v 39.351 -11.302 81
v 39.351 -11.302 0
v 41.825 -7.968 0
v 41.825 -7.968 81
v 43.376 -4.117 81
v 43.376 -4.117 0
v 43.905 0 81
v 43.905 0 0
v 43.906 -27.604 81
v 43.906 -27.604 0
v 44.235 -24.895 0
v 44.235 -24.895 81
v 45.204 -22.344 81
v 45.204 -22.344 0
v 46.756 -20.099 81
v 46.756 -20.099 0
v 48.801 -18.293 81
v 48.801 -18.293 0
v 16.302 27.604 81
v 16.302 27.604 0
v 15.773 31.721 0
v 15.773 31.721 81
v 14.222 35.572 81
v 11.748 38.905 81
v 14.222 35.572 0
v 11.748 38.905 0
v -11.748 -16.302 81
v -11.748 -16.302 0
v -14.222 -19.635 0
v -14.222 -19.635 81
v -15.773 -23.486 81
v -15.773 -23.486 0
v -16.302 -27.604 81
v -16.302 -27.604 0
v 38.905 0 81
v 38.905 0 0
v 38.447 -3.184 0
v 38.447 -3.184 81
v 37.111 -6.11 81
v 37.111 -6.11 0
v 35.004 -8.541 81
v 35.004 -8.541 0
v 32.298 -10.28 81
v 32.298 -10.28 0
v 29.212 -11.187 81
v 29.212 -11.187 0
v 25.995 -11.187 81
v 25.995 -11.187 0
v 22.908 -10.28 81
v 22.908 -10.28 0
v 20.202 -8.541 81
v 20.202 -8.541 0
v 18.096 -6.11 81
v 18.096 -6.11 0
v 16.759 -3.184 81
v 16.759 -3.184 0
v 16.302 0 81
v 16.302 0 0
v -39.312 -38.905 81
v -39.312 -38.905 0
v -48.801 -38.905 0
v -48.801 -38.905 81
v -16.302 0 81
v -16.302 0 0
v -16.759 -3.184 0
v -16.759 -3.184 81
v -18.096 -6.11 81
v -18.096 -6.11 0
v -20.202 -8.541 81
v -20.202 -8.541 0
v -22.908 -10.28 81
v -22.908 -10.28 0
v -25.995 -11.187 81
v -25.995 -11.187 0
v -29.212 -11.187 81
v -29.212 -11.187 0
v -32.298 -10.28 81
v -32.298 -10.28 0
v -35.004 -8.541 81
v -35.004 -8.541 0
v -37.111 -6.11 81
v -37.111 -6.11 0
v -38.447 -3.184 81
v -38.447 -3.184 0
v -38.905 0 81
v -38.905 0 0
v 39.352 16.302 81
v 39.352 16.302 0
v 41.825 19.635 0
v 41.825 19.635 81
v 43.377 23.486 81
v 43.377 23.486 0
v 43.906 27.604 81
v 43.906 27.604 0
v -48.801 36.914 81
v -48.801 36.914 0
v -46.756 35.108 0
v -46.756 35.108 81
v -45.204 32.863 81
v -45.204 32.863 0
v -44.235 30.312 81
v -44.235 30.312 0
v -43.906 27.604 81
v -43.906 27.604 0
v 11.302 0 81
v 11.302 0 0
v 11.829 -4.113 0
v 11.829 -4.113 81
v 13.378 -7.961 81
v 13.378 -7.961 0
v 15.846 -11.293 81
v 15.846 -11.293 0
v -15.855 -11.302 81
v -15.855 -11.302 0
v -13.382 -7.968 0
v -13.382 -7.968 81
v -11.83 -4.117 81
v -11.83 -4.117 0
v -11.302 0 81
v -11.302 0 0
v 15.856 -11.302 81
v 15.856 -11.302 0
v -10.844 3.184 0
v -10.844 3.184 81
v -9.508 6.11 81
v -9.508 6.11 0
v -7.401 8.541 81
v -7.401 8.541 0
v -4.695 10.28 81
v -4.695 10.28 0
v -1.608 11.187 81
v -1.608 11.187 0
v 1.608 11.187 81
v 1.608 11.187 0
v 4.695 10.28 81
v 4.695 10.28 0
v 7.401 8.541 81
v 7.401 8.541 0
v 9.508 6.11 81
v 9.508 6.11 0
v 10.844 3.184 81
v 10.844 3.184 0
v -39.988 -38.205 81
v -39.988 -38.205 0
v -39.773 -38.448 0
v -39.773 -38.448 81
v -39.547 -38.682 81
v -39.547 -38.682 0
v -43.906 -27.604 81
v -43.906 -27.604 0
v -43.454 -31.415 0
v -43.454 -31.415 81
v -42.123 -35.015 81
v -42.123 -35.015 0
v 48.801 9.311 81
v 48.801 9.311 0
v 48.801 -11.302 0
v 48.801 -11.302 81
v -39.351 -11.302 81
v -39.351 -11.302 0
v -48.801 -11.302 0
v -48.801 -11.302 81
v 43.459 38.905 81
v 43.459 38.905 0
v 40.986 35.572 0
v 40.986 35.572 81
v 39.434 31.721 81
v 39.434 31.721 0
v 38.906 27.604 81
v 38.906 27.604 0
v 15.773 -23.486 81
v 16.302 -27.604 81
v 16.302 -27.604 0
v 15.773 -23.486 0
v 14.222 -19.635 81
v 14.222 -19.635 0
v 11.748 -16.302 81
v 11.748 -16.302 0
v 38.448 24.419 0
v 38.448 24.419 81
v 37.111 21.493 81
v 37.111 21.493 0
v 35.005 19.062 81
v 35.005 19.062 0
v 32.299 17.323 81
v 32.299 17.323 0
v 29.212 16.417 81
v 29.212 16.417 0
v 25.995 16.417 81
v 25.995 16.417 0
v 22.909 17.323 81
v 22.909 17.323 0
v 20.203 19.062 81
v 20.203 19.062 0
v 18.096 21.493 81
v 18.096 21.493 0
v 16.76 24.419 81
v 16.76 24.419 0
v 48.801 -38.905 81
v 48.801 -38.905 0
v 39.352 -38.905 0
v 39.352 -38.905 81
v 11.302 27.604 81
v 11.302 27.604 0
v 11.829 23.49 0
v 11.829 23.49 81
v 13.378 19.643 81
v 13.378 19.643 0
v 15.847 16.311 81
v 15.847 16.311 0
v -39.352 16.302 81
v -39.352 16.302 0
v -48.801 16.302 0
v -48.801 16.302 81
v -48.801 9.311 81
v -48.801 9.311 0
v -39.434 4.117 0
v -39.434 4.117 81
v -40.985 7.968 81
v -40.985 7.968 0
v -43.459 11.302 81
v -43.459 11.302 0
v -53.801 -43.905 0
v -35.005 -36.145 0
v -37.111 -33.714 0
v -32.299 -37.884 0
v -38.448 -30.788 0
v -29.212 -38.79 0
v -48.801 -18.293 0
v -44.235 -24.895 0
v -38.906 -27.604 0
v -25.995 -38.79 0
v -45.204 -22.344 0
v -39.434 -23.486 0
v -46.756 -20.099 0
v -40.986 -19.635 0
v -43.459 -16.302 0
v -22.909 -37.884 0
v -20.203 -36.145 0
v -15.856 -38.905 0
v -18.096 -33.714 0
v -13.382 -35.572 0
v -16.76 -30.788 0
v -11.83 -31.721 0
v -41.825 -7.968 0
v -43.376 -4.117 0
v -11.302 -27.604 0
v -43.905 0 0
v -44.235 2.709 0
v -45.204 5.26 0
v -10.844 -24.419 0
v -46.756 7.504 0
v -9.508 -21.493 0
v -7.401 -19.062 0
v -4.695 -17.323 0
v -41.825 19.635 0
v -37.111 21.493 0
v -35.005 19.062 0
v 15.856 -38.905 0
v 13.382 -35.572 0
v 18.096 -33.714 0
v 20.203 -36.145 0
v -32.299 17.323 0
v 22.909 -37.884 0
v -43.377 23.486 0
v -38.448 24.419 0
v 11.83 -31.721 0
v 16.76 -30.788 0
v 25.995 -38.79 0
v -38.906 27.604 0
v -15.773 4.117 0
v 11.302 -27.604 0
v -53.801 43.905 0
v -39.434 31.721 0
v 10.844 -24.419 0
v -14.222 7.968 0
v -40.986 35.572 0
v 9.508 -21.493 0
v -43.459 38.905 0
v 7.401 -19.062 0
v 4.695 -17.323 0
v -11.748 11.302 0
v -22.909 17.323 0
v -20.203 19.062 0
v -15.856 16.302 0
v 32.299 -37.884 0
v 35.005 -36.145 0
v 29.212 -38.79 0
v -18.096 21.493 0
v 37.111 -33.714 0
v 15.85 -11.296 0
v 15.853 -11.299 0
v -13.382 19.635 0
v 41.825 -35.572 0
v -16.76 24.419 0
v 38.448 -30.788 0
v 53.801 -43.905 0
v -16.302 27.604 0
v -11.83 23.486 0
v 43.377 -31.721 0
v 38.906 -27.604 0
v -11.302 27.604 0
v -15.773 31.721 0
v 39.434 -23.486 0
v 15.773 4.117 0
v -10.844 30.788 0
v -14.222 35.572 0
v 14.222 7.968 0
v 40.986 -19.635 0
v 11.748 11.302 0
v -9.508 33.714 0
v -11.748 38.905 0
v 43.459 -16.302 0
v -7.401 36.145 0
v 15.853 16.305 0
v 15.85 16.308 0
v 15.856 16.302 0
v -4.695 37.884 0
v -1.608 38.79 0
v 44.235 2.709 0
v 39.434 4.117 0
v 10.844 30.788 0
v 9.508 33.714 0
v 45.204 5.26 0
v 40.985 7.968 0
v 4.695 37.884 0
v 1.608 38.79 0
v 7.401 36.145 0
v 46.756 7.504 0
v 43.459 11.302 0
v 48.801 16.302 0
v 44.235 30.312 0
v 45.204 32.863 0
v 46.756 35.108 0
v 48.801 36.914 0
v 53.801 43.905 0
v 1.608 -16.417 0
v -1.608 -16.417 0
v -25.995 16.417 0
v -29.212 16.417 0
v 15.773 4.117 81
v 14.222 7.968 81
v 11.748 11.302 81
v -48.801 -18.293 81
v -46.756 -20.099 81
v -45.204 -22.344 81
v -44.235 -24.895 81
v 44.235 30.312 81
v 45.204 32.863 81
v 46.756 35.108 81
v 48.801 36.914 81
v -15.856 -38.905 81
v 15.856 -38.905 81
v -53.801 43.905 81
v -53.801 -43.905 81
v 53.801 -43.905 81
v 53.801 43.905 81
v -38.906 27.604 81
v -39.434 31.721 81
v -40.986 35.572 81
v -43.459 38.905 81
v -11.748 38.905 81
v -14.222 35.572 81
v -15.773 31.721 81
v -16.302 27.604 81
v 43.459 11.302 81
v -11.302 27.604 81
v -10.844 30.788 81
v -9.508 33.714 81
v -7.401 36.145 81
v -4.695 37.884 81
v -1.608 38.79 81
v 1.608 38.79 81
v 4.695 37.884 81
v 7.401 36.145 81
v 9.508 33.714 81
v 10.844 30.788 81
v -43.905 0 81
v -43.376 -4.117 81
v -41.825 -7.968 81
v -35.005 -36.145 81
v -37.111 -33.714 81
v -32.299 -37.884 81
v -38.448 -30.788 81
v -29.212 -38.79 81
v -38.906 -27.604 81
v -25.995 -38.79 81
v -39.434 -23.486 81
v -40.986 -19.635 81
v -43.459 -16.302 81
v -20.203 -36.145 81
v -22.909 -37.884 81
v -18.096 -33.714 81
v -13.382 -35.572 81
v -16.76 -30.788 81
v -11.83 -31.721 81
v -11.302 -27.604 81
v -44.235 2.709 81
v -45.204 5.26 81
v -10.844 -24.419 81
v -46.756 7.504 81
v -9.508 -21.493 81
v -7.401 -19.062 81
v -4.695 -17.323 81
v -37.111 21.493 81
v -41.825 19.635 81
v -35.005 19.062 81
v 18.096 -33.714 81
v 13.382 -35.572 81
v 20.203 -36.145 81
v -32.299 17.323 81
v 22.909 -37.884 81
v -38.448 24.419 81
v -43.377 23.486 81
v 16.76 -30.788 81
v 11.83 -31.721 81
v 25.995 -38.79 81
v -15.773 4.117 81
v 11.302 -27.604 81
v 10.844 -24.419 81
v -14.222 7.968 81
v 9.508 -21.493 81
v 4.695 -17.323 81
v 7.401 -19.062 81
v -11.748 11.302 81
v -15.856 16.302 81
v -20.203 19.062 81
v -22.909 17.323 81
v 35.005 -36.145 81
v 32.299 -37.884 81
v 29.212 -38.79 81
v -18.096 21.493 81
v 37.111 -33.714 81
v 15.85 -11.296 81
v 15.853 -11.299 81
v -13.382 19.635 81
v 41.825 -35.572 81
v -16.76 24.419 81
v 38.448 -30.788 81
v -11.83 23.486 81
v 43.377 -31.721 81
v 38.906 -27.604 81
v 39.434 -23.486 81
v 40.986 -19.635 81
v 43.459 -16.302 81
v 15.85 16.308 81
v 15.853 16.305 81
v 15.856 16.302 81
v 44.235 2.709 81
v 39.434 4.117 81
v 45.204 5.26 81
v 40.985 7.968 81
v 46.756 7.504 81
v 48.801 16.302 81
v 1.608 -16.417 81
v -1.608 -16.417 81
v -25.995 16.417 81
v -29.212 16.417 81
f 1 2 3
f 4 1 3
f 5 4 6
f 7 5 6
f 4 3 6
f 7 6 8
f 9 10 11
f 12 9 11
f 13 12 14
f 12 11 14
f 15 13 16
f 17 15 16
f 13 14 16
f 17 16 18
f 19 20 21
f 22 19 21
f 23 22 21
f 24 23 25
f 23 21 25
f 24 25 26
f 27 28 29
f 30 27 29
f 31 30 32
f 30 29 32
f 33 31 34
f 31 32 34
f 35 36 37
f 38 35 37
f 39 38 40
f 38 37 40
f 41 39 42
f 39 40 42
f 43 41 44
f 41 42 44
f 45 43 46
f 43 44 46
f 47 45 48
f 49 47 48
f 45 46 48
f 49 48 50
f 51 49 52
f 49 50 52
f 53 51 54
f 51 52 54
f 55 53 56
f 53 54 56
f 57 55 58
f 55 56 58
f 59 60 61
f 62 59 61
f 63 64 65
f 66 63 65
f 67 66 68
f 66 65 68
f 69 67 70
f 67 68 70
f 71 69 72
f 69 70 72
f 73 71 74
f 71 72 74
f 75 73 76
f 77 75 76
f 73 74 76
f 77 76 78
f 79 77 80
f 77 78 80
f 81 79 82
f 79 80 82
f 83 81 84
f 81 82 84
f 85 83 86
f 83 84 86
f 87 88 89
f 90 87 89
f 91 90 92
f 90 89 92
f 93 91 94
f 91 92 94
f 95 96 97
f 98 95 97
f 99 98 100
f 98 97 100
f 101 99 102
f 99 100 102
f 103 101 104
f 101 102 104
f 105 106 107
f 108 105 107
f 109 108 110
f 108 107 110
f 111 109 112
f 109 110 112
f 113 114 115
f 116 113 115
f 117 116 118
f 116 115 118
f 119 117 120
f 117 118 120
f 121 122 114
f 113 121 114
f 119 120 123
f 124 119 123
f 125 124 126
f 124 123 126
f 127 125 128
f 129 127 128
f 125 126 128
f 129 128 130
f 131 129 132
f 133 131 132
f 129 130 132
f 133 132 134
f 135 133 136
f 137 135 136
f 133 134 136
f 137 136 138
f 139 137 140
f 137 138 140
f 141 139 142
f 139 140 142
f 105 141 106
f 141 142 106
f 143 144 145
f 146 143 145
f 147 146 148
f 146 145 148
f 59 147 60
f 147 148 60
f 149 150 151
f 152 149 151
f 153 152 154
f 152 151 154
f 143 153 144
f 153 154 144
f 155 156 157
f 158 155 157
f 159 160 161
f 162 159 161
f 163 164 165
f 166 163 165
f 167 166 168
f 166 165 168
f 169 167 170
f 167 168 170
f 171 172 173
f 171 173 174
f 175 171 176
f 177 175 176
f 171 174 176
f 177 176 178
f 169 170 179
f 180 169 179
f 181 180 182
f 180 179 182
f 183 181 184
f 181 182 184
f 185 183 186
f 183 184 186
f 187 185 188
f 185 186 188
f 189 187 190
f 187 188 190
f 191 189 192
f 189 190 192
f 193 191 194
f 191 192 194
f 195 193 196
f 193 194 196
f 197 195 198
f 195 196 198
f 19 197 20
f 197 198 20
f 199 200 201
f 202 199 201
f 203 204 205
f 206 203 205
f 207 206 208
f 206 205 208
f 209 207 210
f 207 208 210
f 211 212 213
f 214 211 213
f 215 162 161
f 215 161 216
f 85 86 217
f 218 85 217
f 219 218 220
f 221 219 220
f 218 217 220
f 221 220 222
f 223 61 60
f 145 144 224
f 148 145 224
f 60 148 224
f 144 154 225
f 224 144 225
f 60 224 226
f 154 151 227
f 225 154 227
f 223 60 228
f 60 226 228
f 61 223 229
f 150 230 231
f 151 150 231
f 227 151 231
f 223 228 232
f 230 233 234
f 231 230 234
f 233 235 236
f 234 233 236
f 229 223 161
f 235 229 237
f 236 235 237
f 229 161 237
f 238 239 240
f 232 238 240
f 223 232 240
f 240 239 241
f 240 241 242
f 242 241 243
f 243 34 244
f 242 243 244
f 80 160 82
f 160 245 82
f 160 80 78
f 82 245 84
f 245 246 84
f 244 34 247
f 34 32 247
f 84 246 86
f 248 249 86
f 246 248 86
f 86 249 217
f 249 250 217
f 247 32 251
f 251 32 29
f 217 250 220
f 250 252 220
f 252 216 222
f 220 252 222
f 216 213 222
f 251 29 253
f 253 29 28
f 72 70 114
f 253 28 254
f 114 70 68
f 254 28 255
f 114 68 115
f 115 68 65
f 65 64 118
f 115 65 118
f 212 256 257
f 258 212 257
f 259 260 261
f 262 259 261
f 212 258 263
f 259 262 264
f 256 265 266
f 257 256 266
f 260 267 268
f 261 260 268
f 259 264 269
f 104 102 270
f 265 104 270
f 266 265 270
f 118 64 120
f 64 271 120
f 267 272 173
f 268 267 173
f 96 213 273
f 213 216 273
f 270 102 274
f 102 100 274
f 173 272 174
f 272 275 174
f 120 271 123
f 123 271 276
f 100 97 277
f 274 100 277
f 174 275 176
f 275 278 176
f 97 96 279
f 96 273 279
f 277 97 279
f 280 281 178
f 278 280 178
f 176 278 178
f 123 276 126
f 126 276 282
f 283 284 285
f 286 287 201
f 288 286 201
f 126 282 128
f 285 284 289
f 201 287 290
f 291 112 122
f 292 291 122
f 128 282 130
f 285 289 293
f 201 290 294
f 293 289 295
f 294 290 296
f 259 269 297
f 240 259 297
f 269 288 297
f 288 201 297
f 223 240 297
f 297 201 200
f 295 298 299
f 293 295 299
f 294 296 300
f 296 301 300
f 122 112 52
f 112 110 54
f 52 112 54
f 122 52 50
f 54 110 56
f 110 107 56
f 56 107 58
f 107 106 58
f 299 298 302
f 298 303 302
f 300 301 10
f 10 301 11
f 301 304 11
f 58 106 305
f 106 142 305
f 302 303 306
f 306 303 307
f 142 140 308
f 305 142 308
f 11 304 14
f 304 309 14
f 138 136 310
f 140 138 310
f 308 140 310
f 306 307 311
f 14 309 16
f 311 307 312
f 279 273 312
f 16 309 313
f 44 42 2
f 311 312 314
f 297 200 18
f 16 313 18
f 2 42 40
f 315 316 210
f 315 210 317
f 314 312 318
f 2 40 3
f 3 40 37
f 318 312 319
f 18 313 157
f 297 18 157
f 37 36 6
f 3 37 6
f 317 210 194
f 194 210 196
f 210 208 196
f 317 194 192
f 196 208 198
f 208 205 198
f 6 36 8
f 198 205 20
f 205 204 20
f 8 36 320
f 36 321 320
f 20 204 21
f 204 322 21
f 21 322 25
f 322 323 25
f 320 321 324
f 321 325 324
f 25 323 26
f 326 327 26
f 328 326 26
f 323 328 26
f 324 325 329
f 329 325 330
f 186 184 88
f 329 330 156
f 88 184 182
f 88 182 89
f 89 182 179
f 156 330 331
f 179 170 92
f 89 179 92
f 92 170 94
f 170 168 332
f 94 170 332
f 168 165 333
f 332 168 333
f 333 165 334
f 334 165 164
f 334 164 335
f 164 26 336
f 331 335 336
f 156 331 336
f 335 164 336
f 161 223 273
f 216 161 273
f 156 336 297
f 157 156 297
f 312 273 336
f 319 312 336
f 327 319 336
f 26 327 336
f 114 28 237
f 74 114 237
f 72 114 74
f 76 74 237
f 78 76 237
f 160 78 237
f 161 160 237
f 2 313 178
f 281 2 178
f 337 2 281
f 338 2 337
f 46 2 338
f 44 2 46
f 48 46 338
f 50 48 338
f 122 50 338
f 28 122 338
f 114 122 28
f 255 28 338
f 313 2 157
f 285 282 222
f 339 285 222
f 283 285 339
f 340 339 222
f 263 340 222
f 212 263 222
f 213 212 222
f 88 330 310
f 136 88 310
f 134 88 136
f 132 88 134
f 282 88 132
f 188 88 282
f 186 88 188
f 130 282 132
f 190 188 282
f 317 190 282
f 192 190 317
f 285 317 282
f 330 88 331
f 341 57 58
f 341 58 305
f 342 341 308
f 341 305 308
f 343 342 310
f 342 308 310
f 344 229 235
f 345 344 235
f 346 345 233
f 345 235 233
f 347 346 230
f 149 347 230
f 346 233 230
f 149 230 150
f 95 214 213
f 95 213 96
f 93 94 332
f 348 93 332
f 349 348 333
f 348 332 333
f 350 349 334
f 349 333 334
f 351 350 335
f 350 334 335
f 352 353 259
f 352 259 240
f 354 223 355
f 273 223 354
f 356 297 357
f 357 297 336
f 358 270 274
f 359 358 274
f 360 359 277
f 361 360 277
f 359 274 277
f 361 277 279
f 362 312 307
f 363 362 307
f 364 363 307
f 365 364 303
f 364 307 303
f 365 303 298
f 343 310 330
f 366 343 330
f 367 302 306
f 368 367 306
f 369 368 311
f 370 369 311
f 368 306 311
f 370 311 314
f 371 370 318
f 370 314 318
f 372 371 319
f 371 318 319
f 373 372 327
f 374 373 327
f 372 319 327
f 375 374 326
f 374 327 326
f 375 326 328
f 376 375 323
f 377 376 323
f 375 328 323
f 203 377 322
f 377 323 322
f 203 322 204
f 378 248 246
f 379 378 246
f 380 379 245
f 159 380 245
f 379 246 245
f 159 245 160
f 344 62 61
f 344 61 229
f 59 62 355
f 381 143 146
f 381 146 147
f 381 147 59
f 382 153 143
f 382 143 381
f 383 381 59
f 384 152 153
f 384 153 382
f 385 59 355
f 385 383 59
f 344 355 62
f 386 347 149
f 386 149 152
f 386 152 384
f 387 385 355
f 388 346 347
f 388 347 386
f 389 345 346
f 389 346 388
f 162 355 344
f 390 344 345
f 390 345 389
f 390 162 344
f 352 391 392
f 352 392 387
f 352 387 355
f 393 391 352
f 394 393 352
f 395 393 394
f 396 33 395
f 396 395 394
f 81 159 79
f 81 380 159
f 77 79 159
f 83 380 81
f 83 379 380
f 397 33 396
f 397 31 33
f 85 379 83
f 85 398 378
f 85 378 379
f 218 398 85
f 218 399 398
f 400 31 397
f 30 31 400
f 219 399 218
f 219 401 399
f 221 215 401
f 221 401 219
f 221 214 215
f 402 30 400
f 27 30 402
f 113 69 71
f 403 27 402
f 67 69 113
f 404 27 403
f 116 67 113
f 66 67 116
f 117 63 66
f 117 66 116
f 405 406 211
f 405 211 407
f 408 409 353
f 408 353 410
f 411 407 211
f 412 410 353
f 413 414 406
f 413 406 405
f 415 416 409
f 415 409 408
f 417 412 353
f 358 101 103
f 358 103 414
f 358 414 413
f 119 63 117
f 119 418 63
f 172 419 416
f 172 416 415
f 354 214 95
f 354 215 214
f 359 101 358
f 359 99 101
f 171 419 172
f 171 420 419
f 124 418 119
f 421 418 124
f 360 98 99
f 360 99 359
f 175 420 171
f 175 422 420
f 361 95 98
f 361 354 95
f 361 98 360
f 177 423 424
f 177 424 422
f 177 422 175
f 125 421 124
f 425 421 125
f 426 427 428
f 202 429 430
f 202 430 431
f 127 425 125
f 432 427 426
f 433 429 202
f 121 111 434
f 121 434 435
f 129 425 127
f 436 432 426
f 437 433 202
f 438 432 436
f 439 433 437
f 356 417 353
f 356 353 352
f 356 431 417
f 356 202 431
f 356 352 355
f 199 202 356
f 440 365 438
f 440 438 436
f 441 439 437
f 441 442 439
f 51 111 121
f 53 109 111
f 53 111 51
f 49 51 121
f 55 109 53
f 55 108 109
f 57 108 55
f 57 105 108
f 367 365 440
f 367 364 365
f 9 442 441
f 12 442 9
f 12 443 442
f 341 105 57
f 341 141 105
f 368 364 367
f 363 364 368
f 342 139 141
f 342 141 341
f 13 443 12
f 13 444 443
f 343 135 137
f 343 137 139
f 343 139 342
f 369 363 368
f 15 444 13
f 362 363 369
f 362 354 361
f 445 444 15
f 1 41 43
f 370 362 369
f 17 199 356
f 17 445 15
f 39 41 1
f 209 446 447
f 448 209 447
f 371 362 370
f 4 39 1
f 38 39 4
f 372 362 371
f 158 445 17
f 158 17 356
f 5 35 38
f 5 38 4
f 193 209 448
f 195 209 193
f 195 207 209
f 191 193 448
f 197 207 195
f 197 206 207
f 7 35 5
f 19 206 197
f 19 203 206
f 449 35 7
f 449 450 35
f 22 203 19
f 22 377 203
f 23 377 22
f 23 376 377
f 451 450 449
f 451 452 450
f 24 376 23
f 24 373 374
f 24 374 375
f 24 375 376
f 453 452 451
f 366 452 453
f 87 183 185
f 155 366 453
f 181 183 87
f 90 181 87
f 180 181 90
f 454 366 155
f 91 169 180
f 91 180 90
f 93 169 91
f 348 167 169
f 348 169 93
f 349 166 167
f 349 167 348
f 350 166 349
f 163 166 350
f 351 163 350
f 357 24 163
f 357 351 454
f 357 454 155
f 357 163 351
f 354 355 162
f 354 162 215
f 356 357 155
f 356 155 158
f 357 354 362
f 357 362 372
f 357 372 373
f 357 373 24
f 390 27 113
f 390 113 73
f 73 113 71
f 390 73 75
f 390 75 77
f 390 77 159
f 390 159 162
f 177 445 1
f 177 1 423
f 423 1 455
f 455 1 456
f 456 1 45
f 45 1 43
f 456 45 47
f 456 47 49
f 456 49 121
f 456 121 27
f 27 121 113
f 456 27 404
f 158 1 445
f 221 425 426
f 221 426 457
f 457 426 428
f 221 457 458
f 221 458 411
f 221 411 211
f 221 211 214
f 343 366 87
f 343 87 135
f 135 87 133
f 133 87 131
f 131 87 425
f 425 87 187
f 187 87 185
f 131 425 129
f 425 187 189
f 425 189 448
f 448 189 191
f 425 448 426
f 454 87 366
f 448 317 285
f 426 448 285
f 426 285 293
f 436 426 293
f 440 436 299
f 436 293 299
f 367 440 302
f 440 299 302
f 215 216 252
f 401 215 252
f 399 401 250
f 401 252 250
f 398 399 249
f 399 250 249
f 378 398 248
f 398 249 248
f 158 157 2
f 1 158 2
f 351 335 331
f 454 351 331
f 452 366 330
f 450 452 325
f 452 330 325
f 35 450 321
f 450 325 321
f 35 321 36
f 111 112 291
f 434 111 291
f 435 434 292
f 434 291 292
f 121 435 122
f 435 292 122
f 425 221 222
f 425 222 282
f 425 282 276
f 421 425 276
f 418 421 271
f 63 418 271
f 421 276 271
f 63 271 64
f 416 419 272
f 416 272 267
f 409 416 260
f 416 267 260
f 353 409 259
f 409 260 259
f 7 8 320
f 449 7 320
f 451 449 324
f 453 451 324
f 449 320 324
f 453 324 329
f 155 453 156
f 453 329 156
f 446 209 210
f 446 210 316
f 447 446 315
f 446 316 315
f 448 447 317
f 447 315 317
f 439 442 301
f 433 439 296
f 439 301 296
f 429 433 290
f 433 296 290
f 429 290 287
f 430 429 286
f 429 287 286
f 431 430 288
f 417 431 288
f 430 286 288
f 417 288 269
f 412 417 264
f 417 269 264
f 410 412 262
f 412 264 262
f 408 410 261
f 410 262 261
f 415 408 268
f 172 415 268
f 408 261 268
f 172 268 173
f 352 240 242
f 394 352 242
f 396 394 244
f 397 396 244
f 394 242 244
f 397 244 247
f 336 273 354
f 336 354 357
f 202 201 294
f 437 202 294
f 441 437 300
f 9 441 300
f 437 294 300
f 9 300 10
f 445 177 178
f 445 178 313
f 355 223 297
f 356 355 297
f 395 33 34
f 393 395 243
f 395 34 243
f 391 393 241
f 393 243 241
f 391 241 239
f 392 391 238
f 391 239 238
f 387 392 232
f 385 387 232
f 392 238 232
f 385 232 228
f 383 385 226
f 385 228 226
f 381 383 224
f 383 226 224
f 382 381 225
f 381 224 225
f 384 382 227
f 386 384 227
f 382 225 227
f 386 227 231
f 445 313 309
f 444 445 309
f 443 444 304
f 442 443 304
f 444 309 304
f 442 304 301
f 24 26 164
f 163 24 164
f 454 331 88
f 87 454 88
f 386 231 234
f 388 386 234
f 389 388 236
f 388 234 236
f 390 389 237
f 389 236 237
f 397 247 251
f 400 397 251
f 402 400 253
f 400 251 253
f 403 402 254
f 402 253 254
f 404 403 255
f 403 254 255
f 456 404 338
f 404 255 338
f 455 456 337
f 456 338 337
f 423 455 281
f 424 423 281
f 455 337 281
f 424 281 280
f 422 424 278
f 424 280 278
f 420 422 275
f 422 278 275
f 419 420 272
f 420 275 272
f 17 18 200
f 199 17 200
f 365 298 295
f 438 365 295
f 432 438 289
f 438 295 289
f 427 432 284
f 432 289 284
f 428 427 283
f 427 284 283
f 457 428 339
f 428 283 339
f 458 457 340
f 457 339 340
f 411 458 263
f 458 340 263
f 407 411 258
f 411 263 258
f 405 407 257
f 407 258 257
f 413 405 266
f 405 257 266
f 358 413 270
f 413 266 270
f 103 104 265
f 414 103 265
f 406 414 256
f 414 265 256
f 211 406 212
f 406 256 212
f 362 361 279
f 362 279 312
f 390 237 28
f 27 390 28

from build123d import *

# Parameters (mm, degrees)
F0_W     = 107.602417469
F0_H     = 87.8107035317
F1_DEPTH = 81


# Not quite as in the source:
# - ends of sketch curves that miss each other by under 0.0002 mm in the source are joined


with BuildPart() as f1:
    # F0 (on Top) → F1 (new body)
    with BuildSketch(Plane.XY):
        Rectangle(F0_W, F0_H)
        with BuildLine():
            Line((-43.4592129171, -38.9053517658), (-48.8012087345, -38.9053517658))
            Line((-48.8012087345, -38.9053517658), (-48.8012087345, -18.2926106175))
            ThreePointArc((-48.8012087345, -18.2926106175), (-45.2040241526, -22.3437425741), (-43.9055000032, -27.6035184325))
            ThreePointArc((-43.9055000032, -27.6035184325), (-42.8947395838, -33.2544350992), (-39.987798415, -38.2046056862))
            ThreePointArc((-39.987798415, -38.2046056862), (-39.6614460497, -38.566308994), (-39.3116101623, -38.9053517658))
            Line((-39.3116101623, -38.9053517658), (-43.4592129171, -38.9053517658))
        make_face(mode=Mode.SUBTRACT)
        with BuildLine():
            ThreePointArc((-38.9055000032, -27.6035184325), (-40.0867237079, -21.511151528), (-43.4592129171, -16.3016850991))
            Line((-43.4592129171, -16.3016850991), (-11.748120417, -16.3016850991))
            ThreePointArc((-11.748120417, -16.3016850991), (-15.120609628, -21.5111515275), (-16.3018333334, -27.6035184325))
            ThreePointArc((-16.3018333334, -27.6035184325), (-27.6036666683, -38.9053517674), (-38.9055000032, -27.6035184325))
        make_face(mode=Mode.SUBTRACT)
        with BuildLine():
            Line((-43.4586830682, -11.3016850991), (-48.8012087345, -11.3016850991))
            Line((-48.8012087345, -11.3016850991), (-48.8012087345, 9.3111358172))
            ThreePointArc((-48.8012087345, 9.3111358172), (-45.2037061615, 5.2599802444), (-43.9050552974, 0))
            ThreePointArc((-43.9050552974, 0), (-42.7238541219, -6.0922822479), (-39.3514275267, -11.3016850991))
            Line((-39.3514275267, -11.3016850991), (-43.4586830682, -11.3016850991))
        make_face(mode=Mode.SUBTRACT)
        with BuildLine():
            ThreePointArc((-11.3018333334, -27.6035184325), (0, -16.3016850991), (11.3018333333, -27.6035184325))
            ThreePointArc((11.3018333334, -27.6035184325), (12.4830570387, -33.6958853375), (15.8555462497, -38.9053517658))
            Line((15.8555462497, -38.9053517658), (-15.8555462474, -38.9053517658))
            ThreePointArc((-15.8555462474, -38.9053517658), (-12.4830570378, -33.6958853372), (-11.3018333334, -27.6035184325))
        make_face(mode=Mode.SUBTRACT)
        with BuildLine():
            ThreePointArc((38.9055, -27.6035184325), (27.6036666667, -38.9053517658), (16.3018333334, -27.6035184325))
            ThreePointArc((16.3018333334, -27.6035184325), (15.120609628, -21.5111515275), (11.748120417, -16.3016850991))
            Line((11.748120417, -16.3016850991), (43.4592129164, -16.3016850991))
            ThreePointArc((43.4592129164, -16.3016850991), (40.0867237054, -21.5111515275), (38.9055, -27.6035184325))
        make_face(mode=Mode.SUBTRACT)
        with BuildLine():
            ThreePointArc((43.9055, -27.6035184325), (45.2040241503, -22.3437425739), (48.8012087345, -18.2926106186))
            Line((48.8012087345, -18.2926106186), (48.8012087345, -38.9053517658))
            Line((48.8012087345, -38.9053517658), (43.4592129164, -38.9053517658))
            Line((43.4592129164, -38.9053517658), (39.3517870837, -38.9053517658))
            ThreePointArc((39.3517870837, -38.9053517658), (42.7242762947, -33.6958853375), (43.9055, -27.6035184325))
        make_face(mode=Mode.SUBTRACT)
        with BuildLine():
            Line((15.855319758, 11.3016850991), (43.4586830625, 11.3016850991))
            ThreePointArc((43.4586830625, 11.3016850991), (40.0862564691, 6.0922822475), (38.9050552942, 0))
            ThreePointArc((38.9050553006, 0), (27.6033701999, -11.3016851007), (16.3016850991, 0))
            ThreePointArc((16.3016850991, 0), (15.1204839236, 6.0922822479), (11.7480573284, 11.3016850991))
            Line((11.7480573284, 11.3016850991), (15.855319758, 11.3016850991))
        make_face(mode=Mode.SUBTRACT)
        with BuildLine():
            ThreePointArc((43.9050552942, 0), (45.2037061591, 5.2599802476), (48.8012087345, 9.3111358227))
            Line((48.8012087345, 9.3111358227), (48.8012087345, -11.3016850991))
            Line((48.8012087345, -11.3016850991), (43.4586830625, -11.3016850991))
            Line((43.4586830625, -11.3016850991), (39.3514275289, -11.3016850991))
            ThreePointArc((39.3514275289, -11.3016850991), (42.7238548196, -6.0922824277), (43.9050552942, 0))
        make_face(mode=Mode.SUBTRACT)
        with BuildLine():
            ThreePointArc((-16.3016850991, 0), (-27.6033701983, -11.3016850991), (-38.9050552974, 0))
            ThreePointArc((-38.9050552974, 0), (-40.086256473, 6.0922822479), (-43.4586830682, 11.3016850991))
            Line((-43.4586830682, 11.3016850991), (-15.8553128699, 11.3016850991))
            Line((-15.8553128699, 11.3016850991), (-11.7480573284, 11.3016850991))
            ThreePointArc((-11.7480573284, 11.3016850991), (-15.1204839236, 6.0922822479), (-16.3016850991, 0))
        make_face(mode=Mode.SUBTRACT)
        with BuildLine():
            Line((-48.8012087345, 16.3016850991), (-48.8012087345, 36.9144262464))
            ThreePointArc((-48.8012087345, 36.9144262464), (-45.2040241503, 32.8632942911), (-43.9055, 27.6035184325))
            ThreePointArc((-43.9055, 27.6035184325), (-42.7242762947, 21.5111515275), (-39.3517870837, 16.3016850991))
            Line((-39.3517870837, 16.3016850991), (-43.4592129164, 16.3016850991))
            Line((-43.4592129164, 16.3016850991), (-48.8012087345, 16.3016850991))
        make_face(mode=Mode.SUBTRACT)
        with BuildLine():
            ThreePointArc((-38.9055, 27.6035184325), (-40.0867237054, 33.6958853375), (-43.4592129164, 38.9053517658))
            Line((-43.4592129164, 38.9053517658), (-15.8555462497, 38.9053517658))
            Line((-15.8555462497, 38.9053517658), (-11.748120417, 38.9053517658))
            ThreePointArc((-11.748120417, 38.9053517658), (-15.120609628, 33.6958853375), (-16.3018333334, 27.6035184325))
            ThreePointArc((-16.3018333334, 27.6035184325), (-27.6036666667, 16.3016850991), (-38.9055, 27.6035184325))
        make_face(mode=Mode.SUBTRACT)
        with BuildLine():
            ThreePointArc((-11.3016850991, 0), (0, 11.3016850991), (11.3016850991, 0))
            ThreePointArc((11.3016850991, 0), (12.4805105623, -6.0863826289), (15.8464978932, -11.2925148079))
            ThreePointArc((15.8464978932, -11.2925148079), (15.8510483075, -11.2971849132), (15.8557668328, -11.3016850991))
            Line((15.8557668328, -11.3016850991), (-15.8553128699, -11.3016850991))
            ThreePointArc((-15.8553128699, -11.3016850991), (-12.4828862747, -6.0922822479), (-11.3016850991, 0))
        make_face(mode=Mode.SUBTRACT)
        with BuildLine():
            ThreePointArc((-11.3018333334, 27.6035184325), (0, 38.9053517658), (11.3018333334, 27.6035184325))
            ThreePointArc((11.3018333334, 27.6035184325), (12.4806822619, 21.5170487891), (15.8467347518, 16.310851698))
            ThreePointArc((15.8467347518, 16.310851698), (15.8512041563, 16.3060464442), (15.8561076969, 16.3016850991))
            Line((15.8561076969, 16.3016850991), (-15.8555462497, 16.3016850991))
            ThreePointArc((-15.8555462497, 16.3016850991), (-12.4830570387, 21.5111515275), (-11.3018333334, 27.6035184325))
        make_face(mode=Mode.SUBTRACT)
        with BuildLine():
            ThreePointArc((38.9055, 27.6035184325), (27.6036666667, 16.3016850991), (16.3018333334, 27.6035184325))
            ThreePointArc((16.3018333334, 27.6035184325), (15.120609628, 33.6958853375), (11.748120417, 38.9053517658))
            Line((11.748120417, 38.9053517658), (15.8555462497, 38.9053517658))
            Line((15.8555462497, 38.9053517658), (43.4592129164, 38.9053517658))
            ThreePointArc((43.4592129164, 38.9053517658), (40.0867237054, 33.6958853375), (38.9055, 27.6035184325))
        make_face(mode=Mode.SUBTRACT)
        with BuildLine():
            ThreePointArc((43.9055, 27.6035184325), (45.2040241503, 32.8632942911), (48.8012087345, 36.9144262464))
            Line((48.8012087345, 36.9144262464), (48.8012087345, 27.6035184325))
            Line((48.8012087345, 27.6035184325), (48.8012087345, 16.3016850991))
            Line((48.8012087345, 16.3016850991), (43.4592129164, 16.3016850991))
            Line((43.4592129164, 16.3016850991), (39.3517870837, 16.3016850991))
            ThreePointArc((39.3517870837, 16.3016850991), (42.7242762947, 21.5111515275), (43.9055, 27.6035184325))
        make_face(mode=Mode.SUBTRACT)
    extrude(amount=F1_DEPTH)


solid = f1.part
